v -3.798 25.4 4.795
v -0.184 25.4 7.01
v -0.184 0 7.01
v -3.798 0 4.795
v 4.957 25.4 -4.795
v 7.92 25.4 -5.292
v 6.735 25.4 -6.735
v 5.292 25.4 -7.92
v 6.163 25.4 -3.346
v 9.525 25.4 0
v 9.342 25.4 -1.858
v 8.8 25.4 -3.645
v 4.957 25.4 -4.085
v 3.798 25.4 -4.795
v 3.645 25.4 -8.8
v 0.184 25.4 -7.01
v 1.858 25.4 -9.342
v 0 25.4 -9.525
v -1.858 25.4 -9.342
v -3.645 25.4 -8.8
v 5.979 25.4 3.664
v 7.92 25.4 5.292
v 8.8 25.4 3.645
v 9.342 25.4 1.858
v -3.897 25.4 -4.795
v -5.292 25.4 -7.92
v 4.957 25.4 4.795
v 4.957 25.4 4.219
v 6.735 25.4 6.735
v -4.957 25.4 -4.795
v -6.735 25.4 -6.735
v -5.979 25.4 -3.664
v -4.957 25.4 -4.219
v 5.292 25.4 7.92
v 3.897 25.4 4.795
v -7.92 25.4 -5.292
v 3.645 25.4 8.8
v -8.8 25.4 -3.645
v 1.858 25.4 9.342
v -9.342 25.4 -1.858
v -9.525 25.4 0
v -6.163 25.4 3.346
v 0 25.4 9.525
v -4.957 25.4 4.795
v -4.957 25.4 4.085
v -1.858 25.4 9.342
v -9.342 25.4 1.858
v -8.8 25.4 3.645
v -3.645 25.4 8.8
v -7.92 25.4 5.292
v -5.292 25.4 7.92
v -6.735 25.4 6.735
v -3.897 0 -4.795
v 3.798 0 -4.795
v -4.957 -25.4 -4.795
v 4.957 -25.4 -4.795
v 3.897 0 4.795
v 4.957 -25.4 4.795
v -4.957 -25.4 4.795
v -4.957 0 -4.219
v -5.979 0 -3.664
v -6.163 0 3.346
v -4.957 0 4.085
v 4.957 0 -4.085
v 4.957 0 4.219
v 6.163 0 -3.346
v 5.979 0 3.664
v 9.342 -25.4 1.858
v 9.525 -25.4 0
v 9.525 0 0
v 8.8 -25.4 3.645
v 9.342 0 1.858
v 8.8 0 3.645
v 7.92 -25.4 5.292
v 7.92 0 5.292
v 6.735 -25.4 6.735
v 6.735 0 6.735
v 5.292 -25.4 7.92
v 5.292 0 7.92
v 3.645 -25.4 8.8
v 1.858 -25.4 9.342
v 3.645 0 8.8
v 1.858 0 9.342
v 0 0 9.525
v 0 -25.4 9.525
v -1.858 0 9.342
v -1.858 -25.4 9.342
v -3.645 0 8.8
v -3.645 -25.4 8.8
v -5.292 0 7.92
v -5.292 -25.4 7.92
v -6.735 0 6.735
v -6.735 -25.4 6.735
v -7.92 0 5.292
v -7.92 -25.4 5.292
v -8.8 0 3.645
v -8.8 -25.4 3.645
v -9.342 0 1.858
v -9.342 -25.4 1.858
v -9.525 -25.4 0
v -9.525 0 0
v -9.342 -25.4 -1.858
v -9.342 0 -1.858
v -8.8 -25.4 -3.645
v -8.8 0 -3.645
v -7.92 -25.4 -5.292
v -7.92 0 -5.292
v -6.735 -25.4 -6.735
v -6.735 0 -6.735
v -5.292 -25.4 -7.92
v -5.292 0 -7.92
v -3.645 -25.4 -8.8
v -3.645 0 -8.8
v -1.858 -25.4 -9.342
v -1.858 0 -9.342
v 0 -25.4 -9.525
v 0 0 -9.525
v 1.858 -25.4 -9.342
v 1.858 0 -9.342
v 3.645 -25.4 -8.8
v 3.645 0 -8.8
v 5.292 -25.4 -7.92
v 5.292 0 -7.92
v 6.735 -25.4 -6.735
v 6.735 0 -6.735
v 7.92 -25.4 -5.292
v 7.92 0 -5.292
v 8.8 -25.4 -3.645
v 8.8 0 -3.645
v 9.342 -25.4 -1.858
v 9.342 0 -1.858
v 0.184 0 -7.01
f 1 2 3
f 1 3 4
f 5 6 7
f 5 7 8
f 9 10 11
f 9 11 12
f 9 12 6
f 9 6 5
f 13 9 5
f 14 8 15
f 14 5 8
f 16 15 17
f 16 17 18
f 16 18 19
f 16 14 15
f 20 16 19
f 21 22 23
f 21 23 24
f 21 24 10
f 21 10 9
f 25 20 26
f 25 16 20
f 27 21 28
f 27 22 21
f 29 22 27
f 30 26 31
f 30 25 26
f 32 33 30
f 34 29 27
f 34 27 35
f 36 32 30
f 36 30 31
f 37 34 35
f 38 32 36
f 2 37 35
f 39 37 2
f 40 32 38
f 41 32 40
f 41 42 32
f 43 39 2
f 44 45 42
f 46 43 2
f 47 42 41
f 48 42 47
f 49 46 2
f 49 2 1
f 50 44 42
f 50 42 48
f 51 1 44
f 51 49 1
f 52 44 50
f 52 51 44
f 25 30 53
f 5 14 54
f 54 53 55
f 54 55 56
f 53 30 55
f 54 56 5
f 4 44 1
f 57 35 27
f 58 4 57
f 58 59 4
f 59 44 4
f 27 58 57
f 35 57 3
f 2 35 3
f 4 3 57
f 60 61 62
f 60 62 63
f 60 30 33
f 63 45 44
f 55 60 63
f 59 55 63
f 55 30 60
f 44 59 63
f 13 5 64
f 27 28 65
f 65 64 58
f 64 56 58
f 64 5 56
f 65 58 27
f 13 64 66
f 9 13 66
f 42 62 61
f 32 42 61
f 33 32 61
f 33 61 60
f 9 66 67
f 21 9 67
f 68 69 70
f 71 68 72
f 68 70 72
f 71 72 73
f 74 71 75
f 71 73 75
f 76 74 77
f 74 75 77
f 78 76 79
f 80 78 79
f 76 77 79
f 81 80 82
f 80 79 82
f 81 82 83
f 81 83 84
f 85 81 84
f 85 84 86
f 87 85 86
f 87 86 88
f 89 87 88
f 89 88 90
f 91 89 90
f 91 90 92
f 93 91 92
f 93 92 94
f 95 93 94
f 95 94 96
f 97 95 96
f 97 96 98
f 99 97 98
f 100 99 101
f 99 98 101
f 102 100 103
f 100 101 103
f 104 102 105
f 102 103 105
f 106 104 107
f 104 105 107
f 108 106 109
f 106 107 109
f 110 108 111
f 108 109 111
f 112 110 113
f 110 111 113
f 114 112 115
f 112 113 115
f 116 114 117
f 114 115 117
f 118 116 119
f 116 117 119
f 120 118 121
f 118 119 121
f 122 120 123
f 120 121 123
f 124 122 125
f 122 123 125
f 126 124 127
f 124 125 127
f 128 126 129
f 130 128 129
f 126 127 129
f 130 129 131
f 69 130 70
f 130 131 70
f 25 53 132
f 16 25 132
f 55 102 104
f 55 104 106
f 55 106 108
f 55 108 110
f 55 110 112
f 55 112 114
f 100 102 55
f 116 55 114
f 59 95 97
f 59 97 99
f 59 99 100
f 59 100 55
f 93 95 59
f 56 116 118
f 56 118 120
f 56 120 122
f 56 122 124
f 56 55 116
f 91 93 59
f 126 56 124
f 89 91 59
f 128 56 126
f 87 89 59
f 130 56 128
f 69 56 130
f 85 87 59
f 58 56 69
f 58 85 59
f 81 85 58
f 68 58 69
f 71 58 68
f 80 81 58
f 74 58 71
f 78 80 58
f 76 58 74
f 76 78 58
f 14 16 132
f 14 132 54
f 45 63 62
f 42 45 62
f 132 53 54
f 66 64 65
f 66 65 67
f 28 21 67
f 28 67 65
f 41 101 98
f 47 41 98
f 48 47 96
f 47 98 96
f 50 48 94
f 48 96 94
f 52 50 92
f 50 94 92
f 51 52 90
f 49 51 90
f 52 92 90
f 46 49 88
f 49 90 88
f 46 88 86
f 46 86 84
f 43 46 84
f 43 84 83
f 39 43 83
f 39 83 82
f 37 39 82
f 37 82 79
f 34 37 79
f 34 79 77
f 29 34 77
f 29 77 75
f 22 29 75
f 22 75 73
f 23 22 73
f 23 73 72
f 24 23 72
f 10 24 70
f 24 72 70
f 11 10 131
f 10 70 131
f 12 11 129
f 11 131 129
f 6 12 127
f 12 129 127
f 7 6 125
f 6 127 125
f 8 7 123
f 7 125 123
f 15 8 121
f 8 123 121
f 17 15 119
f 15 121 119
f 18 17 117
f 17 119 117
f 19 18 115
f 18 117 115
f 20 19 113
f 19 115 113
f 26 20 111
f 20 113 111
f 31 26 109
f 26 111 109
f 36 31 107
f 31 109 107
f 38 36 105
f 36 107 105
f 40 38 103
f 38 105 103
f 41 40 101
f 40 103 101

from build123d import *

# Parameters (mm, degrees)
F0_R     = 9.525
F1_DEPTH = 25.4
F3_DEPTH = 25.401
F4_R     = 9.525
F5_DEPTH = 25.4
F6_W     = 9.9143758416
F6_H     = 9.589554742
F7_DEPTH = 50.801


with BuildPart() as f1:
    # F0 (on Front) → F1 (new body)
    with BuildSketch(Plane.XZ):
        Circle(F0_R)
    extrude(amount=F1_DEPTH)

    # F2 (on Front) → F3 (cut, through all)
    with BuildSketch(Plane.XZ):
        with BuildLine():
            ThreePointArc((-4.7625, 0), (-3.3675960454, -3.3675960454), (0, -4.7625))
            ThreePointArc((0, -4.7625), (3.3675960454, -3.3675960454), (4.7625, 0))
            ThreePointArc((4.7625, 0), (3.3675960454, 3.3675960454), (0, 4.7625))
            ThreePointArc((0, 4.7625), (-3.3675960454, 3.3675960454), (-4.7625, 0))
        make_face()
    extrude(amount=F3_DEPTH, mode=Mode.SUBTRACT)

    # F4 (on face) → F5 (join)
    with BuildSketch(Plane(origin=(0, 0, 0), x_dir=(-1, 0, 0), z_dir=(0, 1, 0))):
        Circle(F4_R)
        Polygon((-5.9788160654, 3.6644153505), (0.1840687509, 7.0100142725), (6.1628848163, 3.3455989219), (5.9788160654, -3.6644153505), (-0.1840687509, -7.0100142725), (-6.1628848163, -3.3455989219), align=None, mode=Mode.SUBTRACT)
    extrude(amount=F5_DEPTH)

    # F6 (on face) → F7 (cut, through all)
    with BuildSketch(Plane.XZ.offset(25.4)):
        Rectangle(F6_W, F6_H)
    extrude(amount=-F7_DEPTH, mode=Mode.SUBTRACT)


solid = f1.part
